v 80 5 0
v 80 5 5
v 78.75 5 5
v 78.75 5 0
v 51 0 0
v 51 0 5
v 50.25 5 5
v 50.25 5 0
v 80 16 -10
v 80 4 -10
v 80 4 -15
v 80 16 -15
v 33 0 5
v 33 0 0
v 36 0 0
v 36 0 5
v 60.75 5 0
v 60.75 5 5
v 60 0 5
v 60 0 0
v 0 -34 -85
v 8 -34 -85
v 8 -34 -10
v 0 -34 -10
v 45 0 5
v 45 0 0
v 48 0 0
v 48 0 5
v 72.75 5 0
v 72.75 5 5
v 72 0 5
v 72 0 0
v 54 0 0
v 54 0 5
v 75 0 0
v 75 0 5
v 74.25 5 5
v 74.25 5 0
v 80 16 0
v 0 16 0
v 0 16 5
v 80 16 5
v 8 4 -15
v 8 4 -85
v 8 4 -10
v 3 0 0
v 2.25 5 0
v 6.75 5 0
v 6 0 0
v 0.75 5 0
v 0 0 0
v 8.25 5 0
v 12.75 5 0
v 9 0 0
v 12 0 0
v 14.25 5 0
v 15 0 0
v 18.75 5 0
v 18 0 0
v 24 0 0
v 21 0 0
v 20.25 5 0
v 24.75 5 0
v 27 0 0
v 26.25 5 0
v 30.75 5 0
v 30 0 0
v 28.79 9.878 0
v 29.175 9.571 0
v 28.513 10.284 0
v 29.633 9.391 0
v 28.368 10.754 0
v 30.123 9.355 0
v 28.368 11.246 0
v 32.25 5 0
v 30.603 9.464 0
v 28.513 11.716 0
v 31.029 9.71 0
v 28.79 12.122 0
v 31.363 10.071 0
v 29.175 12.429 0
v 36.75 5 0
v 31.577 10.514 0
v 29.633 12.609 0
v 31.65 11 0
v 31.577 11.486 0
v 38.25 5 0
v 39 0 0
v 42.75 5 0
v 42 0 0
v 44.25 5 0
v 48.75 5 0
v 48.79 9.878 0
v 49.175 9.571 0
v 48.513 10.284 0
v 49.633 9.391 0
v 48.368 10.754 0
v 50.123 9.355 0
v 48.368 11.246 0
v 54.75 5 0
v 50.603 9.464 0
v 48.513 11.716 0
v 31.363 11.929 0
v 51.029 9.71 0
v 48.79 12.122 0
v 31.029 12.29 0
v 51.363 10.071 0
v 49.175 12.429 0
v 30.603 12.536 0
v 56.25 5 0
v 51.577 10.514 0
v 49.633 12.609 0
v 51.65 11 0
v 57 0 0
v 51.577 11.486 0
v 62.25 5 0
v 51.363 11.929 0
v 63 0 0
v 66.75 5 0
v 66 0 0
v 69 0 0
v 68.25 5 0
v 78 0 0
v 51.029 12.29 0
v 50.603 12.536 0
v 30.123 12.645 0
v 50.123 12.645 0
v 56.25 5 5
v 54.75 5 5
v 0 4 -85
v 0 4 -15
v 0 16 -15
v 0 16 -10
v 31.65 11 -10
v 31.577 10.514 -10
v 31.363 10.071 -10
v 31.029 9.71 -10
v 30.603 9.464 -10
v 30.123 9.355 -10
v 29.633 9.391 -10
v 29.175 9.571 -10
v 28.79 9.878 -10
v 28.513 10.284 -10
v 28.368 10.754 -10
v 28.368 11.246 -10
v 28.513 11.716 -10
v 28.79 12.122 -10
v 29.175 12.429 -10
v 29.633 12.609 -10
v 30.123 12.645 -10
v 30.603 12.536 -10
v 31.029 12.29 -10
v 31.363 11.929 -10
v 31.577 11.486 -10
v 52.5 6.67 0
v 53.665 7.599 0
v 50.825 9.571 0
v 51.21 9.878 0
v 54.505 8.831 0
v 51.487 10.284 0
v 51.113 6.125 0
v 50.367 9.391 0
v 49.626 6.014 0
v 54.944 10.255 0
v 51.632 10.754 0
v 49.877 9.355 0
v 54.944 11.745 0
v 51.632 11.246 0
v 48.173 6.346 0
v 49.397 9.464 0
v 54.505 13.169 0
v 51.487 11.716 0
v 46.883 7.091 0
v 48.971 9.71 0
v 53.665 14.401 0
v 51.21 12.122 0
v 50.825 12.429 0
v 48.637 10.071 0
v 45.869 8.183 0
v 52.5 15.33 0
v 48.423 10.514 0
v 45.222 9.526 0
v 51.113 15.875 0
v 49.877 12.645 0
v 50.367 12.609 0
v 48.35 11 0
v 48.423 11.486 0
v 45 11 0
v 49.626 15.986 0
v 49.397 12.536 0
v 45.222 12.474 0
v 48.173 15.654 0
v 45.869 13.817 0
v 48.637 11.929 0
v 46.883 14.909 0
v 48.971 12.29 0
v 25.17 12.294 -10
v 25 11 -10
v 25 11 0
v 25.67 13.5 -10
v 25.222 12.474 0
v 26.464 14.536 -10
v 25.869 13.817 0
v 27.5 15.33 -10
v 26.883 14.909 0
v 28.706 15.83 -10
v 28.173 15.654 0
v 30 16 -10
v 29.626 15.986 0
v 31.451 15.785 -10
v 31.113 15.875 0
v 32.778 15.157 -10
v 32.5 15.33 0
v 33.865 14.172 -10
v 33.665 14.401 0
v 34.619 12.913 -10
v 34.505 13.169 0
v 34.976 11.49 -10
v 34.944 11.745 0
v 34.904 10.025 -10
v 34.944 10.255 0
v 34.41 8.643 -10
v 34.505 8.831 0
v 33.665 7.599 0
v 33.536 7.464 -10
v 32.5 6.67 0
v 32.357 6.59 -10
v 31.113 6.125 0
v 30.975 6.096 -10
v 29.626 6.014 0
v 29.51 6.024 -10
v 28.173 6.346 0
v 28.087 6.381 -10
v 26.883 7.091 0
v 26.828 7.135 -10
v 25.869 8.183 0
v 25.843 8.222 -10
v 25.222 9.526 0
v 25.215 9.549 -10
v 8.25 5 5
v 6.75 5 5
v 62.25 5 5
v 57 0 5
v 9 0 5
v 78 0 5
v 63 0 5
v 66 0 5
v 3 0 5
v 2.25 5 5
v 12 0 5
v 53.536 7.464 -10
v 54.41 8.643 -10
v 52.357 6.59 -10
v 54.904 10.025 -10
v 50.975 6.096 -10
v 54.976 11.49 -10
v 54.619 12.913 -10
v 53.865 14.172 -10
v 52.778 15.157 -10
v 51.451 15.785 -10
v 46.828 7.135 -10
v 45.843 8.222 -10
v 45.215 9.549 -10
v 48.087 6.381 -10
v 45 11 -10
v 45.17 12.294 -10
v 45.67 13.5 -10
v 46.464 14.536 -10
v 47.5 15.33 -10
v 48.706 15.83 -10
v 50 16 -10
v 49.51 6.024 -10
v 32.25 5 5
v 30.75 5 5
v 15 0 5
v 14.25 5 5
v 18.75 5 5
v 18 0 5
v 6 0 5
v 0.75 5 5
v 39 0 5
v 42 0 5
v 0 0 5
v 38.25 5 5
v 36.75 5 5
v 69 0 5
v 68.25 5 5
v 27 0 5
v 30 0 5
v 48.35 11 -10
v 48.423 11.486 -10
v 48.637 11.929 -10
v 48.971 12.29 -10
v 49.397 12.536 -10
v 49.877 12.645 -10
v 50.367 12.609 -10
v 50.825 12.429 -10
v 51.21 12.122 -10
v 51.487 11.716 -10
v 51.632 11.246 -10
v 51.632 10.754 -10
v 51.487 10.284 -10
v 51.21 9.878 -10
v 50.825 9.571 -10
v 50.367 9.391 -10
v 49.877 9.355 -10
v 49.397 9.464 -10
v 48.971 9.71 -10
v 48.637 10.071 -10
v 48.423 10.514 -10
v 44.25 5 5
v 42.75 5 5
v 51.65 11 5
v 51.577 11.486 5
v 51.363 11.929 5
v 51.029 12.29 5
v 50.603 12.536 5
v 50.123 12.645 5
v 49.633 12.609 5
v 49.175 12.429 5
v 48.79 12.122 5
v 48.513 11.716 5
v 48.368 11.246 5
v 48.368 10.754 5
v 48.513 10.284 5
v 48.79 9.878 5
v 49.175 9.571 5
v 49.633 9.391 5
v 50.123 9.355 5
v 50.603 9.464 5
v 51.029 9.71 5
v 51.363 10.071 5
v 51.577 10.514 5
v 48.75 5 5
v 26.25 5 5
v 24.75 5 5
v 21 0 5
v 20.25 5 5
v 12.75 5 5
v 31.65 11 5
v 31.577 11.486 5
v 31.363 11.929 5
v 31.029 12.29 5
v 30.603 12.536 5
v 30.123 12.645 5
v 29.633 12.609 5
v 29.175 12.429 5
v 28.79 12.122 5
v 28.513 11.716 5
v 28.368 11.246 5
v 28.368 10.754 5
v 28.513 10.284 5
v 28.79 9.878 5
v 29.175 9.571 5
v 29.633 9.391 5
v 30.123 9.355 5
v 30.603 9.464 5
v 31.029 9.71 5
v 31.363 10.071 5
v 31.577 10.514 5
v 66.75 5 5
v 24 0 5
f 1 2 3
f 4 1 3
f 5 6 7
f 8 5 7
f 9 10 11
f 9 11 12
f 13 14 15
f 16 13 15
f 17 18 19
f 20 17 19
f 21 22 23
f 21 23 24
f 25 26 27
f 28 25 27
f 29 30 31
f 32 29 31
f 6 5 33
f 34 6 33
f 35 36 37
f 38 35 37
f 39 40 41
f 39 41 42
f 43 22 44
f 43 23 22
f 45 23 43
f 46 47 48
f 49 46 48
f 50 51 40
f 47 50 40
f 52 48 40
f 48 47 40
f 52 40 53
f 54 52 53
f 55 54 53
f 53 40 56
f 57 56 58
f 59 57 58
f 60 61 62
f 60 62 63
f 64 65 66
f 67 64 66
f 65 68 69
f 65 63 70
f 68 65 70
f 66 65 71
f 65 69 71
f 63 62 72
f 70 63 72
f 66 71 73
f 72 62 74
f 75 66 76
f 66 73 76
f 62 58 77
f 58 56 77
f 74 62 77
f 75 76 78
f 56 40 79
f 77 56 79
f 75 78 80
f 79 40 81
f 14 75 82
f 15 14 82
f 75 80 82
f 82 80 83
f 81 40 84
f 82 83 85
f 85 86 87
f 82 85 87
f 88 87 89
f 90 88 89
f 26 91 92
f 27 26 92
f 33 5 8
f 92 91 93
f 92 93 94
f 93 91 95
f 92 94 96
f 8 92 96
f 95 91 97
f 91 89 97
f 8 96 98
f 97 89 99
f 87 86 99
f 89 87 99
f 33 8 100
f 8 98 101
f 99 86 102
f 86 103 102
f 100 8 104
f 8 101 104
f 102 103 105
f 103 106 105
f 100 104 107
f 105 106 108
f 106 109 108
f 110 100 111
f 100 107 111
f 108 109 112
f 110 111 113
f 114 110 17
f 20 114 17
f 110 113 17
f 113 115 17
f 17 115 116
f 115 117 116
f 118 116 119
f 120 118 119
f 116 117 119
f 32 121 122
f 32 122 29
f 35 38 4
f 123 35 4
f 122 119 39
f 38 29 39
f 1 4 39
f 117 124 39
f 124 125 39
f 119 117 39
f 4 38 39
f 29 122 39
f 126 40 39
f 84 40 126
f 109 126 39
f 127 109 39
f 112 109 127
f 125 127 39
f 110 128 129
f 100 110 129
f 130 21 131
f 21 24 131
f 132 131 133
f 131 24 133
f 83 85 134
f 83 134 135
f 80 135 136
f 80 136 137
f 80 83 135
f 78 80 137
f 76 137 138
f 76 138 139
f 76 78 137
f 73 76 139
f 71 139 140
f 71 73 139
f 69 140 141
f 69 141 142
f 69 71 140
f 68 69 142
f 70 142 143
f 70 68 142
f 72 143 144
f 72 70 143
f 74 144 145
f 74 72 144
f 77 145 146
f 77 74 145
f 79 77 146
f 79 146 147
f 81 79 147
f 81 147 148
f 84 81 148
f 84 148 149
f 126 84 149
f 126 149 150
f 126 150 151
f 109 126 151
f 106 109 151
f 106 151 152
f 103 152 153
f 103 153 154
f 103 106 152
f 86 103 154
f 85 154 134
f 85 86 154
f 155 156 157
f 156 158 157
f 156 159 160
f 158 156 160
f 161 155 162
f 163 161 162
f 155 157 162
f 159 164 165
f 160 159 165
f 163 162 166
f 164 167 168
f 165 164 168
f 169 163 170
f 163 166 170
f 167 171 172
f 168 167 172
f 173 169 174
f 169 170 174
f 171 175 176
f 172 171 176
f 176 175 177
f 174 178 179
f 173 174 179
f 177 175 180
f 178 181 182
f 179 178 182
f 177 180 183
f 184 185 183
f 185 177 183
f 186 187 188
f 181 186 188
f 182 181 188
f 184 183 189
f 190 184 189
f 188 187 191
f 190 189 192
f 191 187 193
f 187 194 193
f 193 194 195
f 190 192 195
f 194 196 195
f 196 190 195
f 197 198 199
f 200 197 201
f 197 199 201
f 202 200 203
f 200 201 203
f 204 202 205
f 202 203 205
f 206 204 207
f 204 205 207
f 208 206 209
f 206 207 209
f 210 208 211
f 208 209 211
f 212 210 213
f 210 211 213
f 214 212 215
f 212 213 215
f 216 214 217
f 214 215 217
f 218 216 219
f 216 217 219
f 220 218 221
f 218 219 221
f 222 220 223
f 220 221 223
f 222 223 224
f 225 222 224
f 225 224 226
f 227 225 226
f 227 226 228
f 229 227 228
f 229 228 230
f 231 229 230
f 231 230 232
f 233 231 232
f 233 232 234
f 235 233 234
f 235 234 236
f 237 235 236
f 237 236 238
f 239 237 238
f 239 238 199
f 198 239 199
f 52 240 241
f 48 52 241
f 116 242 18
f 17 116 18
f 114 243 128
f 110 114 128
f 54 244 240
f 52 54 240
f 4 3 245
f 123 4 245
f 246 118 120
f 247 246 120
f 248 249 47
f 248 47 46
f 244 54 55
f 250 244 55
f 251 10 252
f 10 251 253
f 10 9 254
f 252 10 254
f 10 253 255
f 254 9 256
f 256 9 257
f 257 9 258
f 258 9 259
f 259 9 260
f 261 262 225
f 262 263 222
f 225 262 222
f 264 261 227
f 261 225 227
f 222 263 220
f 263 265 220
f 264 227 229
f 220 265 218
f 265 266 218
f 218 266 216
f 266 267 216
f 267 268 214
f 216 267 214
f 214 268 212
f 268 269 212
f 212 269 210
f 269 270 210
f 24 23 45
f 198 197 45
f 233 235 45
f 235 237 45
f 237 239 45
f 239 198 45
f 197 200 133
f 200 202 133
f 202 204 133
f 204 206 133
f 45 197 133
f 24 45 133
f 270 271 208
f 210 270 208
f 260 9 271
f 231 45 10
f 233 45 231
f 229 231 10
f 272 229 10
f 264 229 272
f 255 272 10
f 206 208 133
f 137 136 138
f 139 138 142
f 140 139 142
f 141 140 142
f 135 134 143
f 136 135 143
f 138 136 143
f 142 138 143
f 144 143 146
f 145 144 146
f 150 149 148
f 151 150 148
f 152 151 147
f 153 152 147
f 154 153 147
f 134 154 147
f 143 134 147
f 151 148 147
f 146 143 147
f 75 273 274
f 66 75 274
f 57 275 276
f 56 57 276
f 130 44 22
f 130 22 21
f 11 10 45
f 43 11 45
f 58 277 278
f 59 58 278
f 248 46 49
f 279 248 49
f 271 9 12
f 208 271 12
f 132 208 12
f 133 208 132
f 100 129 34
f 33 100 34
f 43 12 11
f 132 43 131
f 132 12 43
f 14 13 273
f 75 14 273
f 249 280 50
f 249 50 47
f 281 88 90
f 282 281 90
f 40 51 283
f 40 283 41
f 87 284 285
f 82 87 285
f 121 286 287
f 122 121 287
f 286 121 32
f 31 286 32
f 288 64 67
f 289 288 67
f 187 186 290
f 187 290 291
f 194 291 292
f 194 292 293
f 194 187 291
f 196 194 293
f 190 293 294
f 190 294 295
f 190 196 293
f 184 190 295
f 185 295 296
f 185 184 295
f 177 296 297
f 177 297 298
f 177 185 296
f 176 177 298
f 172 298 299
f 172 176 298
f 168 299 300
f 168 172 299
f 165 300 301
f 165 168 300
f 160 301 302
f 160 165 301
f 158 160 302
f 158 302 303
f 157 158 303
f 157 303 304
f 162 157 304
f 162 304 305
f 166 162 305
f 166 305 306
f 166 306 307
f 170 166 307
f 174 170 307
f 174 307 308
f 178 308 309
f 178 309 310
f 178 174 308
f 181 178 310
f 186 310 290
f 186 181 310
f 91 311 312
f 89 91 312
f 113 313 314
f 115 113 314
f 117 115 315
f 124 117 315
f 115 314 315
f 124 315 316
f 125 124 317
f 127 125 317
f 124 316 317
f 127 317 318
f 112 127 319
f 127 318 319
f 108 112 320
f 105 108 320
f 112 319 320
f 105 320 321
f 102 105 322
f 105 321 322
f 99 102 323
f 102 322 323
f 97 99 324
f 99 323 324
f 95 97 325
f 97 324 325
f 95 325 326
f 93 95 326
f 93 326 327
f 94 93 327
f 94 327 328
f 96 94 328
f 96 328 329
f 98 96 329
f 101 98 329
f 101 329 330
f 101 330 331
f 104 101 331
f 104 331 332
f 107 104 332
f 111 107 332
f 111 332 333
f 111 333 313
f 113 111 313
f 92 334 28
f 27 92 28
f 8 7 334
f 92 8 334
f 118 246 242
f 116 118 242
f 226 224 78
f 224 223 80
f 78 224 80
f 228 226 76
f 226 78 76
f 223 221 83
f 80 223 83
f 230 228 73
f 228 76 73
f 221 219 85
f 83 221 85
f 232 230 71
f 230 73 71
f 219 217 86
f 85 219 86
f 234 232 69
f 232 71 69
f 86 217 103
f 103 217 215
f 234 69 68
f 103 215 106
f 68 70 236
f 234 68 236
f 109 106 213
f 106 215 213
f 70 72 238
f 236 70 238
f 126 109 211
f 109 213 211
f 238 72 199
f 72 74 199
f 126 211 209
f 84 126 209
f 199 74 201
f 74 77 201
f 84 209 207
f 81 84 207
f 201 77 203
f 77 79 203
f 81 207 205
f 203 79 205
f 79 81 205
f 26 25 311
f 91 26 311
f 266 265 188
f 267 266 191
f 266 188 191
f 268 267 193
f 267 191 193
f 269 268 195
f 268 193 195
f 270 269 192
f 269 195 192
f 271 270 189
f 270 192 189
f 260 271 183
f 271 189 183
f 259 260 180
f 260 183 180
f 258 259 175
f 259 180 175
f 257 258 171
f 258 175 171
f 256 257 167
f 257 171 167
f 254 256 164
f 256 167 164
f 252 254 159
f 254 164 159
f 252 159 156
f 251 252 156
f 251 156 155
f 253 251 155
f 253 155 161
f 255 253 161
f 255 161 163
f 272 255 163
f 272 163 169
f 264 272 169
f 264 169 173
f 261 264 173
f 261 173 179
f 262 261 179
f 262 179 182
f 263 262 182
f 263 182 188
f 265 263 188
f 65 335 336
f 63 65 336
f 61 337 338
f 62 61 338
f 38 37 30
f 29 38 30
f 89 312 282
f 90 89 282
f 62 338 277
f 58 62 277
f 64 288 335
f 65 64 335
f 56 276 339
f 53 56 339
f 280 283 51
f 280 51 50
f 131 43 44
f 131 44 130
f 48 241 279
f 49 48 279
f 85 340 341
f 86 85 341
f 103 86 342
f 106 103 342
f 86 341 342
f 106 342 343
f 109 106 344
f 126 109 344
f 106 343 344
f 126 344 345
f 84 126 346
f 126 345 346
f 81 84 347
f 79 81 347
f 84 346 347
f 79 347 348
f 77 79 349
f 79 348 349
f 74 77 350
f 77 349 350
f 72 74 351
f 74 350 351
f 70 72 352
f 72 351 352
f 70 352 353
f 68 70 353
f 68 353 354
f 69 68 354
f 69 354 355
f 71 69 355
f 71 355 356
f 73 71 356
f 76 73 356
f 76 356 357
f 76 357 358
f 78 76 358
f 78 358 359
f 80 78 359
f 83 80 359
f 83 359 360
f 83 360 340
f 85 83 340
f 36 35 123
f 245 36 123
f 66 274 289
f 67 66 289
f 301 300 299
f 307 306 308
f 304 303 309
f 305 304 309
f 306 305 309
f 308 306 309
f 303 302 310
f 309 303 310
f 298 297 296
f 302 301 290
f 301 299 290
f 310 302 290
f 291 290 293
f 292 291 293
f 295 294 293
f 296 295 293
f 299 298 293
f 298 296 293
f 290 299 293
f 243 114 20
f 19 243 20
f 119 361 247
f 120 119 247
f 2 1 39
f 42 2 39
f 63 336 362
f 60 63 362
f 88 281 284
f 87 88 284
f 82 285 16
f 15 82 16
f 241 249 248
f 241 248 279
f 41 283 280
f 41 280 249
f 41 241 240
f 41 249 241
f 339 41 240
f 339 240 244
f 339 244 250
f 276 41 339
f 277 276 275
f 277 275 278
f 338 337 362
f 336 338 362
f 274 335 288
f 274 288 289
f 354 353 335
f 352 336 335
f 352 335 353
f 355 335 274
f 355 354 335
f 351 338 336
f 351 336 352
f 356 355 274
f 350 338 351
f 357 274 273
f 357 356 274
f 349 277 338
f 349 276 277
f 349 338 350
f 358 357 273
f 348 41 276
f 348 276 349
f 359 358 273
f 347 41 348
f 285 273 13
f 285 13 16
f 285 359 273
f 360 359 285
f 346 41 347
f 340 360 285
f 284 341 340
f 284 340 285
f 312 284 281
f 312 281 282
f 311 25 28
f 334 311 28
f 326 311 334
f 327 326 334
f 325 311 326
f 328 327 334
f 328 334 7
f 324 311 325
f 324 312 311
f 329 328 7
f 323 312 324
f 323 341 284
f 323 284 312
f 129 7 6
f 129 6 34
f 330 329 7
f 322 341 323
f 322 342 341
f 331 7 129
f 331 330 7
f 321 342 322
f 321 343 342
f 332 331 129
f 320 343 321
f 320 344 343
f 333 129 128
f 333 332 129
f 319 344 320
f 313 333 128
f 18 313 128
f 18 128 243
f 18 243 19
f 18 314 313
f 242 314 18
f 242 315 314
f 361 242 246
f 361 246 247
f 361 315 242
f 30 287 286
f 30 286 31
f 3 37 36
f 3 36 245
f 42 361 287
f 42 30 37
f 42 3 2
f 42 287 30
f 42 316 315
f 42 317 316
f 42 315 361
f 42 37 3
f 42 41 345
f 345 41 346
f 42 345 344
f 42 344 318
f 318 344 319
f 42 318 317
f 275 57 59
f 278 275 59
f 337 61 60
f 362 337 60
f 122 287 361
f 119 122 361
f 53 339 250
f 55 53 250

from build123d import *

# Parameters (mm, degrees)
SKETCH_1_W          = 80
SKETCH_1_H          = 16
EXTRUDE_1_DEPTH     = 5
CUT_EXTRUDE_1_REACH = 83.737
CUT_EXTRUDE_2_REACH = 83.737
SKETCH_3_R          = 1.65
SKETCH_4_R          = 5
SKETCH_4_R_2        = 1.65
EXTRUDE_2_DEPTH     = 10
EXTRUDE_2_2_DEPTH   = 10
SKETCH_5_W          = 80
SKETCH_5_H          = 12
EXTRUDE_3_DEPTH     = 5
SKETCH_6_W          = 8
SKETCH_6_H          = 50
EXTRUDE_4_DEPTH     = 5
SKETCH_7_W          = 8
SKETCH_7_H          = 38
EXTRUDE_5_DEPTH     = 70


with BuildPart() as part:
    # ｽｹｯﾁ1 → ﾎﾞｽ - 押し出し1 (new body)
    with BuildSketch(Plane.XY):
        with Locations((40, 8)):
            Rectangle(SKETCH_1_W, SKETCH_1_H)
    extrude(amount=EXTRUDE_1_DEPTH)

    # ｽｹｯﾁ2 → ｶｯﾄ - 押し出し1 (cut, up to next)
    with BuildSketch(Plane.XY.offset(5), mode=Mode.PRIVATE) as cut_extrude_1_sk1:
        Polygon((0, 0), (0.75, 5), (2.25, 5), (3, 0), align=None)
    cut_extrude_1_tool1 = extrude(cut_extrude_1_sk1.sketch, amount=-CUT_EXTRUDE_1_REACH, mode=Mode.PRIVATE) & part.part
    # ｽｹｯﾁ2 → ｶｯﾄ - 押し出し1 (cut, up to next)
    with BuildSketch(Plane.XY.offset(5), mode=Mode.PRIVATE) as cut_extrude_1_sk2:
        Polygon((6, 0), (9, 0), (8.25, 5), (6.75, 5), align=None)
    cut_extrude_1_tool2 = extrude(cut_extrude_1_sk2.sketch, amount=-CUT_EXTRUDE_1_REACH, mode=Mode.PRIVATE) & part.part
    # ｽｹｯﾁ2 → ｶｯﾄ - 押し出し1 (cut, up to next)
    with BuildSketch(Plane.XY.offset(5), mode=Mode.PRIVATE) as cut_extrude_1_sk3:
        Polygon((12, 0), (15, 0), (14.25, 5), (12.75, 5), align=None)
    cut_extrude_1_tool3 = extrude(cut_extrude_1_sk3.sketch, amount=-CUT_EXTRUDE_1_REACH, mode=Mode.PRIVATE) & part.part
    # ｽｹｯﾁ2 → ｶｯﾄ - 押し出し1 (cut, up to next)
    with BuildSketch(Plane.XY.offset(5), mode=Mode.PRIVATE) as cut_extrude_1_sk4:
        Polygon((18, 0), (21, 0), (20.25, 5), (18.75, 5), align=None)
    cut_extrude_1_tool4 = extrude(cut_extrude_1_sk4.sketch, amount=-CUT_EXTRUDE_1_REACH, mode=Mode.PRIVATE) & part.part
    # ｽｹｯﾁ2 → ｶｯﾄ - 押し出し1 (cut, up to next)
    with BuildSketch(Plane.XY.offset(5), mode=Mode.PRIVATE) as cut_extrude_1_sk5:
        Polygon((24, 0), (27, 0), (26.25, 5), (24.75, 5), align=None)
    cut_extrude_1_tool5 = extrude(cut_extrude_1_sk5.sketch, amount=-CUT_EXTRUDE_1_REACH, mode=Mode.PRIVATE) & part.part
    # ｽｹｯﾁ2 → ｶｯﾄ - 押し出し1 (cut, up to next)
    with BuildSketch(Plane.XY.offset(5), mode=Mode.PRIVATE) as cut_extrude_1_sk6:
        Polygon((30, 0), (33, 0), (32.25, 5), (30.75, 5), align=None)
    cut_extrude_1_tool6 = extrude(cut_extrude_1_sk6.sketch, amount=-CUT_EXTRUDE_1_REACH, mode=Mode.PRIVATE) & part.part
    # ｽｹｯﾁ2 → ｶｯﾄ - 押し出し1 (cut, up to next)
    with BuildSketch(Plane.XY.offset(5), mode=Mode.PRIVATE) as cut_extrude_1_sk7:
        Polygon((36, 0), (39, 0), (38.25, 5), (36.75, 5), align=None)
    cut_extrude_1_tool7 = extrude(cut_extrude_1_sk7.sketch, amount=-CUT_EXTRUDE_1_REACH, mode=Mode.PRIVATE) & part.part
    # ｽｹｯﾁ2 → ｶｯﾄ - 押し出し1 (cut, up to next)
    with BuildSketch(Plane.XY.offset(5), mode=Mode.PRIVATE) as cut_extrude_1_sk8:
        Polygon((42, 0), (45, 0), (44.25, 5), (42.75, 5), align=None)
    cut_extrude_1_tool8 = extrude(cut_extrude_1_sk8.sketch, amount=-CUT_EXTRUDE_1_REACH, mode=Mode.PRIVATE) & part.part
    # ｽｹｯﾁ2 → ｶｯﾄ - 押し出し1 (cut, up to next)
    with BuildSketch(Plane.XY.offset(5), mode=Mode.PRIVATE) as cut_extrude_1_sk9:
        Polygon((48, 0), (51, 0), (50.25, 5), (48.75, 5), align=None)
    cut_extrude_1_tool9 = extrude(cut_extrude_1_sk9.sketch, amount=-CUT_EXTRUDE_1_REACH, mode=Mode.PRIVATE) & part.part
    # ｽｹｯﾁ2 → ｶｯﾄ - 押し出し1 (cut, up to next)
    with BuildSketch(Plane.XY.offset(5), mode=Mode.PRIVATE) as cut_extrude_1_sk10:
        Polygon((54, 0), (57, 0), (56.25, 5), (54.75, 5), align=None)
    cut_extrude_1_tool10 = extrude(cut_extrude_1_sk10.sketch, amount=-CUT_EXTRUDE_1_REACH, mode=Mode.PRIVATE) & part.part
    # ｽｹｯﾁ2 → ｶｯﾄ - 押し出し1 (cut, up to next)
    with BuildSketch(Plane.XY.offset(5), mode=Mode.PRIVATE) as cut_extrude_1_sk11:
        Polygon((60, 0), (63, 0), (62.25, 5), (60.75, 5), align=None)
    cut_extrude_1_tool11 = extrude(cut_extrude_1_sk11.sketch, amount=-CUT_EXTRUDE_1_REACH, mode=Mode.PRIVATE) & part.part
    # ｽｹｯﾁ2 → ｶｯﾄ - 押し出し1 (cut, up to next)
    with BuildSketch(Plane.XY.offset(5), mode=Mode.PRIVATE) as cut_extrude_1_sk12:
        Polygon((66, 0), (69, 0), (68.25, 5), (66.75, 5), align=None)
    cut_extrude_1_tool12 = extrude(cut_extrude_1_sk12.sketch, amount=-CUT_EXTRUDE_1_REACH, mode=Mode.PRIVATE) & part.part
    # ｽｹｯﾁ2 → ｶｯﾄ - 押し出し1 (cut, up to next)
    with BuildSketch(Plane.XY.offset(5), mode=Mode.PRIVATE) as cut_extrude_1_sk13:
        Polygon((72, 0), (75, 0), (74.25, 5), (72.75, 5), align=None)
    cut_extrude_1_tool13 = extrude(cut_extrude_1_sk13.sketch, amount=-CUT_EXTRUDE_1_REACH, mode=Mode.PRIVATE) & part.part
    # ｽｹｯﾁ2 → ｶｯﾄ - 押し出し1 (cut, up to next)
    with BuildSketch(Plane.XY.offset(5), mode=Mode.PRIVATE) as cut_extrude_1_sk14:
        Polygon((78, 0), (81, 0), (80.25, 5), (78.75, 5), align=None)
    cut_extrude_1_tool14 = extrude(cut_extrude_1_sk14.sketch, amount=-CUT_EXTRUDE_1_REACH, mode=Mode.PRIVATE) & part.part
    add(cut_extrude_1_tool1.solids().sort_by_distance((1.5, 2.222222, 5))[0], mode=Mode.SUBTRACT)
    add(cut_extrude_1_tool2.solids().sort_by_distance((7.5, 2.222222, 5))[0], mode=Mode.SUBTRACT)
    add(cut_extrude_1_tool3.solids().sort_by_distance((13.5, 2.222222, 5))[0], mode=Mode.SUBTRACT)
    add(cut_extrude_1_tool4.solids().sort_by_distance((19.5, 2.222222, 5))[0], mode=Mode.SUBTRACT)
    add(cut_extrude_1_tool5.solids().sort_by_distance((25.5, 2.222222, 5))[0], mode=Mode.SUBTRACT)
    add(cut_extrude_1_tool6.solids().sort_by_distance((31.5, 2.222222, 5))[0], mode=Mode.SUBTRACT)
    add(cut_extrude_1_tool7.solids().sort_by_distance((37.5, 2.222222, 5))[0], mode=Mode.SUBTRACT)
    add(cut_extrude_1_tool8.solids().sort_by_distance((43.5, 2.222222, 5))[0], mode=Mode.SUBTRACT)
    add(cut_extrude_1_tool9.solids().sort_by_distance((49.5, 2.222222, 5))[0], mode=Mode.SUBTRACT)
    add(cut_extrude_1_tool10.solids().sort_by_distance((55.5, 2.222222, 5))[0], mode=Mode.SUBTRACT)
    add(cut_extrude_1_tool11.solids().sort_by_distance((61.5, 2.222222, 5))[0], mode=Mode.SUBTRACT)
    add(cut_extrude_1_tool12.solids().sort_by_distance((67.5, 2.222222, 5))[0], mode=Mode.SUBTRACT)
    add(cut_extrude_1_tool13.solids().sort_by_distance((73.5, 2.222222, 5))[0], mode=Mode.SUBTRACT)
    add(cut_extrude_1_tool14.solids().sort_by_distance((79.5, 2.222222, 5))[0], mode=Mode.SUBTRACT)

    # ｽｹｯﾁ3 → ｶｯﾄ - 押し出し2 (cut, up to next)
    with BuildSketch(Plane.XY.offset(5), mode=Mode.PRIVATE) as cut_extrude_2_sk1:
        with Locations((30, 11)):
            Circle(SKETCH_3_R)
    cut_extrude_2_tool1 = extrude(cut_extrude_2_sk1.sketch, amount=-CUT_EXTRUDE_2_REACH, mode=Mode.PRIVATE) & part.part
    # ｽｹｯﾁ3 → ｶｯﾄ - 押し出し2 (cut, up to next)
    with BuildSketch(Plane.XY.offset(5), mode=Mode.PRIVATE) as cut_extrude_2_sk2:
        with Locations((50, 11)):
            Circle(SKETCH_3_R)
    cut_extrude_2_tool2 = extrude(cut_extrude_2_sk2.sketch, amount=-CUT_EXTRUDE_2_REACH, mode=Mode.PRIVATE) & part.part
    add(cut_extrude_2_tool1.solids().sort_by_distance((30, 11, 5))[0], mode=Mode.SUBTRACT)
    add(cut_extrude_2_tool2.solids().sort_by_distance((50, 11, 5))[0], mode=Mode.SUBTRACT)


with BuildPart() as body_2:
    # ｽｹｯﾁ4 → ﾎﾞｽ - 押し出し2 (new body)
    with BuildSketch(Plane(origin=(0, 0, 0), x_dir=(-1, 0, 0), z_dir=(0, 0, -1))):
        with Locations((-50, 11)):
            Circle(SKETCH_4_R)
        with Locations((-50, 11)):
            Circle(SKETCH_4_R_2, mode=Mode.SUBTRACT)
    extrude(amount=EXTRUDE_2_DEPTH)



with BuildPart() as body_3:
    # ｽｹｯﾁ4 → Extrude 2 2 (new body)
    with BuildSketch(Plane(origin=(0, 0, 0), x_dir=(-1, 0, 0), z_dir=(0, 0, -1))):
        with Locations((-30, 11)):
            Circle(SKETCH_4_R)
        with Locations(Location((-30, 11, 0), (0, 0, 180))):
            Circle(SKETCH_4_R_2, mode=Mode.SUBTRACT)
    extrude(amount=EXTRUDE_2_2_DEPTH)


with BuildPart() as body_2_1:
    add(body_2.part)

    add(body_3.part)  # ﾎﾞｽ - 押し出し3 merges body 3
    # ｽｹｯﾁ5 → ﾎﾞｽ - 押し出し3 (add)
    with BuildSketch(Plane(origin=(0, 0, -10), x_dir=(-1, 0, 0), z_dir=(0, 0, -1))):
        with Locations((-40, 10)):
            Rectangle(SKETCH_5_W, SKETCH_5_H)
    extrude(amount=EXTRUDE_3_DEPTH)

    # ｽｹｯﾁ6 → ﾎﾞｽ - 押し出し4 (add)
    with BuildSketch(Plane(origin=(0, 0, -15), x_dir=(-1, 0, 0), z_dir=(0, 0, -1))):
        with Locations((-4, -9)):
            Rectangle(SKETCH_6_W, SKETCH_6_H)
    extrude(amount=-EXTRUDE_4_DEPTH)

    # ｽｹｯﾁ7 → ﾎﾞｽ - 押し出し5 (add)
    with BuildSketch(Plane(origin=(0, 0, -15), x_dir=(-1, 0, 0), z_dir=(0, 0, -1))):
        with Locations((-4, -15)):
            Rectangle(SKETCH_7_W, SKETCH_7_H)
    extrude(amount=EXTRUDE_5_DEPTH)


solid = Compound([part.part, body_2_1.part])
